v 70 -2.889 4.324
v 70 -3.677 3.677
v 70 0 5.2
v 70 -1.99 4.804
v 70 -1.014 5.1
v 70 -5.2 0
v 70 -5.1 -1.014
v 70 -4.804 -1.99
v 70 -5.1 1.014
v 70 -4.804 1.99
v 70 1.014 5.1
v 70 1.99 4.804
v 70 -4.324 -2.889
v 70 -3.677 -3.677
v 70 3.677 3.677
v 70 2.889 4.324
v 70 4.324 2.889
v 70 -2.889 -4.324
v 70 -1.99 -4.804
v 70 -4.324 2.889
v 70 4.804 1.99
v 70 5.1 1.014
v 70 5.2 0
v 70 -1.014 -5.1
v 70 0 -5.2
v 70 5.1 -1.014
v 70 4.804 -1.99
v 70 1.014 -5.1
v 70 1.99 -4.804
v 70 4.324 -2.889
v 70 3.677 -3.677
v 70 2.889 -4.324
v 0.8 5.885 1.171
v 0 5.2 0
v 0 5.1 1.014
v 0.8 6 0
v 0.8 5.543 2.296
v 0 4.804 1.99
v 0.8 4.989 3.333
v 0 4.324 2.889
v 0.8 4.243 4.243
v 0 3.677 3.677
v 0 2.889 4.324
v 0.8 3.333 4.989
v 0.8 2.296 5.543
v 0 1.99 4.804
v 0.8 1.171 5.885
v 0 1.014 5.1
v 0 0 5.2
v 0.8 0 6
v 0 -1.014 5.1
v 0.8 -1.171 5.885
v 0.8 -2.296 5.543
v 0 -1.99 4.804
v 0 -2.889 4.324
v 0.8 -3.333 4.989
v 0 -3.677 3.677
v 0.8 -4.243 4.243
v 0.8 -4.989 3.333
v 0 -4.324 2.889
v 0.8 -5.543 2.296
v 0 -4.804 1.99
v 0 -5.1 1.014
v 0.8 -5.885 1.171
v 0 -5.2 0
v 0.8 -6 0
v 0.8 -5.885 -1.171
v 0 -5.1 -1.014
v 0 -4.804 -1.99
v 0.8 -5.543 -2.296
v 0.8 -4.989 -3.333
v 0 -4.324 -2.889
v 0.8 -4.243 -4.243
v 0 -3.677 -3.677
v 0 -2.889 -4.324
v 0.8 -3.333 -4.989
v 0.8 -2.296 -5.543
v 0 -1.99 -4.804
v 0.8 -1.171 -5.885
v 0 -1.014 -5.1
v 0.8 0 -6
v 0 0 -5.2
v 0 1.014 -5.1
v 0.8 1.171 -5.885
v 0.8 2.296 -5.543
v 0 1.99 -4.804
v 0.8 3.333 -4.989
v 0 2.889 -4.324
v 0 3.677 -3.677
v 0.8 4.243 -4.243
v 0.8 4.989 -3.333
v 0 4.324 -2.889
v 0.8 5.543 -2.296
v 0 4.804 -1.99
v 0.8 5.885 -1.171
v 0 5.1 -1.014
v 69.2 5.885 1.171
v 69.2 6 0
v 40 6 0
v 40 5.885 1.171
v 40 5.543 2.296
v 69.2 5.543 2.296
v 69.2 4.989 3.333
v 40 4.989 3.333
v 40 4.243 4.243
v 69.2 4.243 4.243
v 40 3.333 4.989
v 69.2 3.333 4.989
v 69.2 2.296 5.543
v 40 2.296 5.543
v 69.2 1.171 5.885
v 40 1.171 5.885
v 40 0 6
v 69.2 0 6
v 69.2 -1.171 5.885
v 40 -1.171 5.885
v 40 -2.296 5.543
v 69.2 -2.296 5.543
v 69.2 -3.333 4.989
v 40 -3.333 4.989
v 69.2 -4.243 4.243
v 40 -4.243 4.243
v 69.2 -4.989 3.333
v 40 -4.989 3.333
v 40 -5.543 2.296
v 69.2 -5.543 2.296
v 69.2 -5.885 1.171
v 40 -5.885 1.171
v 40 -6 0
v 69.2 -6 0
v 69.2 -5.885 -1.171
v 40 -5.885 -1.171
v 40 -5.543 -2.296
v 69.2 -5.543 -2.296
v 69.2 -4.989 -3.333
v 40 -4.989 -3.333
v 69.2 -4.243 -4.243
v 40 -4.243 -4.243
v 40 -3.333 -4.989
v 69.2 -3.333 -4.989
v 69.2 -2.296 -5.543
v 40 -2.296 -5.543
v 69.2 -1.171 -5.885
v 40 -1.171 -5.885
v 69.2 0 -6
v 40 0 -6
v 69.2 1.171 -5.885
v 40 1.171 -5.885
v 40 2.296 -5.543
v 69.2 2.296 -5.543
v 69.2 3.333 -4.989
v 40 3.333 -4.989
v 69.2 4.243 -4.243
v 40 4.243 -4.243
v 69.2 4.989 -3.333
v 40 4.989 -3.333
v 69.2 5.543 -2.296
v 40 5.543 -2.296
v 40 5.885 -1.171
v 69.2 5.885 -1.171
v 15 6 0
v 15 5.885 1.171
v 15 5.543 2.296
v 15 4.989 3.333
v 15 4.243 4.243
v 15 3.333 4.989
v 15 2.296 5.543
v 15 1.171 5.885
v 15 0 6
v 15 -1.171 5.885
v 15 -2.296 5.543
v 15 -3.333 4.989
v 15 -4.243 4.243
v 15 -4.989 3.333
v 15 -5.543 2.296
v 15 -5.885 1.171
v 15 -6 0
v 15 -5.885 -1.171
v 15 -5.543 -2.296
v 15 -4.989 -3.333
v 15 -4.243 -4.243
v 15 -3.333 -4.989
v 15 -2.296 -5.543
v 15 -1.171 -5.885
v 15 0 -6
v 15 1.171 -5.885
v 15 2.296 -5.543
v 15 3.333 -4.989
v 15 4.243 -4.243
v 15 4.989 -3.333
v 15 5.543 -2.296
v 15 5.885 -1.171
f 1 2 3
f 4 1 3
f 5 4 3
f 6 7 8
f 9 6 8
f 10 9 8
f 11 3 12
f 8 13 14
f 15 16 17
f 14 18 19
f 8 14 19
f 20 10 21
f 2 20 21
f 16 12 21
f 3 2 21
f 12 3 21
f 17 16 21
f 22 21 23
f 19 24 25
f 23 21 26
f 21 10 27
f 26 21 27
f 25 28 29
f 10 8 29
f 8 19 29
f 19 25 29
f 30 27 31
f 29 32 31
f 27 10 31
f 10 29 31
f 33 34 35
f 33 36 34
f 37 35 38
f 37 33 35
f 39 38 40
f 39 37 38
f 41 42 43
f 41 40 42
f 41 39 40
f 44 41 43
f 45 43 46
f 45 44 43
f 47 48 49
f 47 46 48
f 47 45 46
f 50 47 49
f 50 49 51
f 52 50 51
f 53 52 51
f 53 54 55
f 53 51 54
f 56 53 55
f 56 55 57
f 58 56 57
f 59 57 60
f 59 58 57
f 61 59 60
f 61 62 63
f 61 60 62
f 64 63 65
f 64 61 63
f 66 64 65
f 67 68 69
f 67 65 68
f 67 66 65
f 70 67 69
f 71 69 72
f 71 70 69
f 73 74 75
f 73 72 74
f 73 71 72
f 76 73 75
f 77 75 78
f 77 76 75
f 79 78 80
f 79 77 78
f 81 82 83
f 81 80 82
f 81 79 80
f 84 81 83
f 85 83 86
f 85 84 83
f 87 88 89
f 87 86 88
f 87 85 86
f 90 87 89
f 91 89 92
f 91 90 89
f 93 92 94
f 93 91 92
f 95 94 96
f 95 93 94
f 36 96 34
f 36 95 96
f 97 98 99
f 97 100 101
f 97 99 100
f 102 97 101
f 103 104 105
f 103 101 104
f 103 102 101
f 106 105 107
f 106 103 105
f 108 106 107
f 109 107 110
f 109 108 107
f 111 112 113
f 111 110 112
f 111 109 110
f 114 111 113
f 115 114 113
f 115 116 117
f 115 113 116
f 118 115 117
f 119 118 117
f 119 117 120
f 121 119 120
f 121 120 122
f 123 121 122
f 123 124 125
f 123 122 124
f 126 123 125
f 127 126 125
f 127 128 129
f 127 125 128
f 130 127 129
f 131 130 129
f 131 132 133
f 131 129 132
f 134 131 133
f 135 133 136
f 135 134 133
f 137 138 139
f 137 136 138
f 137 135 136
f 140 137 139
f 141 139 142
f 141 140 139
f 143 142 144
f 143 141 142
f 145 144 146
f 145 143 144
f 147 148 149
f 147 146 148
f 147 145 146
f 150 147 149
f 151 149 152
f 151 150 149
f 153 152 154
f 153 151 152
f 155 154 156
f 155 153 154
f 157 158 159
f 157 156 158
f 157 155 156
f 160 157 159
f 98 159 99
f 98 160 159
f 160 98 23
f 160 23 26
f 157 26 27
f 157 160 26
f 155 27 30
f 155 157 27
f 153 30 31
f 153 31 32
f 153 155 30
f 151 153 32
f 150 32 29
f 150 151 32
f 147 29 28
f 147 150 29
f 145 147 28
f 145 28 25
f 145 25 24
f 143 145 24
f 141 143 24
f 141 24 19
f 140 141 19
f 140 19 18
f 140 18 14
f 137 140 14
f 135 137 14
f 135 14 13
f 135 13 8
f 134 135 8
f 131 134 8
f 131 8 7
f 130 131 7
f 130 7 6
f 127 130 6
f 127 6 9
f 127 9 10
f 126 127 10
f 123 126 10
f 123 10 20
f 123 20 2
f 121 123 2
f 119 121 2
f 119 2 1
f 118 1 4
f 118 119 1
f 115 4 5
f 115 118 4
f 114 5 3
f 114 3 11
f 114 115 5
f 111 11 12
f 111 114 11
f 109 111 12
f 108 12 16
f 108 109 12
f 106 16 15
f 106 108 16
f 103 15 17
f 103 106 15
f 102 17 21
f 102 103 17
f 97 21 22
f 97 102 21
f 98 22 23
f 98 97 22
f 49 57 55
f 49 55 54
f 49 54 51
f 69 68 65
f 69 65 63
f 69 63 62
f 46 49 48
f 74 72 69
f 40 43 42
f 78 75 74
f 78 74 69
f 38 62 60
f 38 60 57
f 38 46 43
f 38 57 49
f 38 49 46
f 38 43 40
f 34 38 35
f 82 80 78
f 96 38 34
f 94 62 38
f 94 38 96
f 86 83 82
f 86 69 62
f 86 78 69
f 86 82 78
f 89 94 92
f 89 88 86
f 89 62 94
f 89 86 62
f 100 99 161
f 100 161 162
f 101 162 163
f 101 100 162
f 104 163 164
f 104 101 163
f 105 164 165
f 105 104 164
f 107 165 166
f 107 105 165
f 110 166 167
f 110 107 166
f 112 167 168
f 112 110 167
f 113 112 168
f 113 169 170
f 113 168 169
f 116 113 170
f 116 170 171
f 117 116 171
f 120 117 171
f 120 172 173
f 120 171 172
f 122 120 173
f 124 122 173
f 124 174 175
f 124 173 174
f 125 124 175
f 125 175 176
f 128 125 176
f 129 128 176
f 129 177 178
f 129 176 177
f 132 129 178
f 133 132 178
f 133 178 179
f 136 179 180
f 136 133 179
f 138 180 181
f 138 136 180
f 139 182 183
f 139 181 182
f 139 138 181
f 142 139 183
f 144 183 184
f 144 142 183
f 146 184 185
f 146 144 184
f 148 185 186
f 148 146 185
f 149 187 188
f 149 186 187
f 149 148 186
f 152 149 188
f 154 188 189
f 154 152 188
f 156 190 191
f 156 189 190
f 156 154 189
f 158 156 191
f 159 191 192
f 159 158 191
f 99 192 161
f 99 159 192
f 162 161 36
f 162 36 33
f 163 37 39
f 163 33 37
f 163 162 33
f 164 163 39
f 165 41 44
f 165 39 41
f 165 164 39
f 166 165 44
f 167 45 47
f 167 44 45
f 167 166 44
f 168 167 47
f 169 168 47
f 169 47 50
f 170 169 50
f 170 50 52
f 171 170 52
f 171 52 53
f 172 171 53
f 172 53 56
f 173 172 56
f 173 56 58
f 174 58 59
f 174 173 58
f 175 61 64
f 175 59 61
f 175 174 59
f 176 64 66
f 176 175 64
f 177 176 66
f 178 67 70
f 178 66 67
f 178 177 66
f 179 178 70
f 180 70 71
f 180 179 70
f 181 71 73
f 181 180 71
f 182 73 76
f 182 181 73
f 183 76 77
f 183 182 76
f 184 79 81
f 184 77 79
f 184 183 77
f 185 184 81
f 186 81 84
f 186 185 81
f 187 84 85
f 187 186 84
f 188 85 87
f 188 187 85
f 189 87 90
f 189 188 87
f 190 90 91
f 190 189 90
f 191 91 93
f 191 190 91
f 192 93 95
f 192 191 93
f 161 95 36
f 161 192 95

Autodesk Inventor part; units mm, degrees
ref_plane "YZ Plane" through (0, 0, 0) normal (1, 0, 0) x (0, 1, 0)
ref_plane "XZ Plane" through (0, 0, 0) normal (0, 1, 0) x (-1, 0, 0)
sketch "Sketch1" plane through (0, 0, 0) normal (0, 0, 1) x (1, 0, 0)
  line L0 (0, 0) -> (0, 6)
  line L1 (0, 6) -> (15, 6)
  line L2 (15, 6) -> (15, 6)
  line L3 (15, 6) -> (40, 6)
  line L4 (40, 6) -> (40, 6)
  line L5 (40, 6) -> (70, 6)
  line L6 (70, 6) -> (70, 0)
  line L7 (70, 0) -> (0, 0)
  dimension "d1" = 12
  dimension "d3" = 12
  dimension "d4" = 15
  dimension "d5" = 55
  dimension "d6" = 30
revolve "Revolution1" add sketch "Sketch1" angle 360 about axis through (70, 0, 0) along (-1, 0, 0)
thread "Thread1" size "M12x1.75" class "6g" standard "ISO Metric profile" length 15
thread "Thread2" size "M12x1.75" class "6g" standard "ISO Metric profile" length 30
chamfer "Chamfer1" distance 0.8 angle 45 2 edges at (70, -6, 0) (0, -6, 0)
ref_plane "Work Plane1" through (15, 0, 0) normal (1, 0, 0) x (0, 1, 0)
sketch "Sketch2" plane through (15, 0, 0) normal (1, 0, 0) x (0, 1, 0)
  circle A0 centre (0, 0) radius 6
  point P0 (0, 0)
  dimension "d29" = 12
boundary_patch "Boundary Patch1"
equation "\"d8\" = d4"
equation "\"d23\" = b"
equation "\"d25\" = chamfer"
equation "\"d1\" = d"
equation "\"d3\" = d1_"
equation "\"d4\" = b1"
equation "\"d5\" = L"
equation "\"d6\" = b"
equation "\"d29\" = d"
equation "\"chamfer\" = 0.8"
equation "\"d\" = 12"
equation "\"d1_\" = 12"
equation "\"b1\" = 15"
equation "\"L\" = 55"
equation "\"b\" = 30"
equation "\"d28\" = -b1"
equation "\"Grip_Length\" = 25"
properties part number "Stud M12-6g×55 GOST 22034-76" material "Steel, Mild"
